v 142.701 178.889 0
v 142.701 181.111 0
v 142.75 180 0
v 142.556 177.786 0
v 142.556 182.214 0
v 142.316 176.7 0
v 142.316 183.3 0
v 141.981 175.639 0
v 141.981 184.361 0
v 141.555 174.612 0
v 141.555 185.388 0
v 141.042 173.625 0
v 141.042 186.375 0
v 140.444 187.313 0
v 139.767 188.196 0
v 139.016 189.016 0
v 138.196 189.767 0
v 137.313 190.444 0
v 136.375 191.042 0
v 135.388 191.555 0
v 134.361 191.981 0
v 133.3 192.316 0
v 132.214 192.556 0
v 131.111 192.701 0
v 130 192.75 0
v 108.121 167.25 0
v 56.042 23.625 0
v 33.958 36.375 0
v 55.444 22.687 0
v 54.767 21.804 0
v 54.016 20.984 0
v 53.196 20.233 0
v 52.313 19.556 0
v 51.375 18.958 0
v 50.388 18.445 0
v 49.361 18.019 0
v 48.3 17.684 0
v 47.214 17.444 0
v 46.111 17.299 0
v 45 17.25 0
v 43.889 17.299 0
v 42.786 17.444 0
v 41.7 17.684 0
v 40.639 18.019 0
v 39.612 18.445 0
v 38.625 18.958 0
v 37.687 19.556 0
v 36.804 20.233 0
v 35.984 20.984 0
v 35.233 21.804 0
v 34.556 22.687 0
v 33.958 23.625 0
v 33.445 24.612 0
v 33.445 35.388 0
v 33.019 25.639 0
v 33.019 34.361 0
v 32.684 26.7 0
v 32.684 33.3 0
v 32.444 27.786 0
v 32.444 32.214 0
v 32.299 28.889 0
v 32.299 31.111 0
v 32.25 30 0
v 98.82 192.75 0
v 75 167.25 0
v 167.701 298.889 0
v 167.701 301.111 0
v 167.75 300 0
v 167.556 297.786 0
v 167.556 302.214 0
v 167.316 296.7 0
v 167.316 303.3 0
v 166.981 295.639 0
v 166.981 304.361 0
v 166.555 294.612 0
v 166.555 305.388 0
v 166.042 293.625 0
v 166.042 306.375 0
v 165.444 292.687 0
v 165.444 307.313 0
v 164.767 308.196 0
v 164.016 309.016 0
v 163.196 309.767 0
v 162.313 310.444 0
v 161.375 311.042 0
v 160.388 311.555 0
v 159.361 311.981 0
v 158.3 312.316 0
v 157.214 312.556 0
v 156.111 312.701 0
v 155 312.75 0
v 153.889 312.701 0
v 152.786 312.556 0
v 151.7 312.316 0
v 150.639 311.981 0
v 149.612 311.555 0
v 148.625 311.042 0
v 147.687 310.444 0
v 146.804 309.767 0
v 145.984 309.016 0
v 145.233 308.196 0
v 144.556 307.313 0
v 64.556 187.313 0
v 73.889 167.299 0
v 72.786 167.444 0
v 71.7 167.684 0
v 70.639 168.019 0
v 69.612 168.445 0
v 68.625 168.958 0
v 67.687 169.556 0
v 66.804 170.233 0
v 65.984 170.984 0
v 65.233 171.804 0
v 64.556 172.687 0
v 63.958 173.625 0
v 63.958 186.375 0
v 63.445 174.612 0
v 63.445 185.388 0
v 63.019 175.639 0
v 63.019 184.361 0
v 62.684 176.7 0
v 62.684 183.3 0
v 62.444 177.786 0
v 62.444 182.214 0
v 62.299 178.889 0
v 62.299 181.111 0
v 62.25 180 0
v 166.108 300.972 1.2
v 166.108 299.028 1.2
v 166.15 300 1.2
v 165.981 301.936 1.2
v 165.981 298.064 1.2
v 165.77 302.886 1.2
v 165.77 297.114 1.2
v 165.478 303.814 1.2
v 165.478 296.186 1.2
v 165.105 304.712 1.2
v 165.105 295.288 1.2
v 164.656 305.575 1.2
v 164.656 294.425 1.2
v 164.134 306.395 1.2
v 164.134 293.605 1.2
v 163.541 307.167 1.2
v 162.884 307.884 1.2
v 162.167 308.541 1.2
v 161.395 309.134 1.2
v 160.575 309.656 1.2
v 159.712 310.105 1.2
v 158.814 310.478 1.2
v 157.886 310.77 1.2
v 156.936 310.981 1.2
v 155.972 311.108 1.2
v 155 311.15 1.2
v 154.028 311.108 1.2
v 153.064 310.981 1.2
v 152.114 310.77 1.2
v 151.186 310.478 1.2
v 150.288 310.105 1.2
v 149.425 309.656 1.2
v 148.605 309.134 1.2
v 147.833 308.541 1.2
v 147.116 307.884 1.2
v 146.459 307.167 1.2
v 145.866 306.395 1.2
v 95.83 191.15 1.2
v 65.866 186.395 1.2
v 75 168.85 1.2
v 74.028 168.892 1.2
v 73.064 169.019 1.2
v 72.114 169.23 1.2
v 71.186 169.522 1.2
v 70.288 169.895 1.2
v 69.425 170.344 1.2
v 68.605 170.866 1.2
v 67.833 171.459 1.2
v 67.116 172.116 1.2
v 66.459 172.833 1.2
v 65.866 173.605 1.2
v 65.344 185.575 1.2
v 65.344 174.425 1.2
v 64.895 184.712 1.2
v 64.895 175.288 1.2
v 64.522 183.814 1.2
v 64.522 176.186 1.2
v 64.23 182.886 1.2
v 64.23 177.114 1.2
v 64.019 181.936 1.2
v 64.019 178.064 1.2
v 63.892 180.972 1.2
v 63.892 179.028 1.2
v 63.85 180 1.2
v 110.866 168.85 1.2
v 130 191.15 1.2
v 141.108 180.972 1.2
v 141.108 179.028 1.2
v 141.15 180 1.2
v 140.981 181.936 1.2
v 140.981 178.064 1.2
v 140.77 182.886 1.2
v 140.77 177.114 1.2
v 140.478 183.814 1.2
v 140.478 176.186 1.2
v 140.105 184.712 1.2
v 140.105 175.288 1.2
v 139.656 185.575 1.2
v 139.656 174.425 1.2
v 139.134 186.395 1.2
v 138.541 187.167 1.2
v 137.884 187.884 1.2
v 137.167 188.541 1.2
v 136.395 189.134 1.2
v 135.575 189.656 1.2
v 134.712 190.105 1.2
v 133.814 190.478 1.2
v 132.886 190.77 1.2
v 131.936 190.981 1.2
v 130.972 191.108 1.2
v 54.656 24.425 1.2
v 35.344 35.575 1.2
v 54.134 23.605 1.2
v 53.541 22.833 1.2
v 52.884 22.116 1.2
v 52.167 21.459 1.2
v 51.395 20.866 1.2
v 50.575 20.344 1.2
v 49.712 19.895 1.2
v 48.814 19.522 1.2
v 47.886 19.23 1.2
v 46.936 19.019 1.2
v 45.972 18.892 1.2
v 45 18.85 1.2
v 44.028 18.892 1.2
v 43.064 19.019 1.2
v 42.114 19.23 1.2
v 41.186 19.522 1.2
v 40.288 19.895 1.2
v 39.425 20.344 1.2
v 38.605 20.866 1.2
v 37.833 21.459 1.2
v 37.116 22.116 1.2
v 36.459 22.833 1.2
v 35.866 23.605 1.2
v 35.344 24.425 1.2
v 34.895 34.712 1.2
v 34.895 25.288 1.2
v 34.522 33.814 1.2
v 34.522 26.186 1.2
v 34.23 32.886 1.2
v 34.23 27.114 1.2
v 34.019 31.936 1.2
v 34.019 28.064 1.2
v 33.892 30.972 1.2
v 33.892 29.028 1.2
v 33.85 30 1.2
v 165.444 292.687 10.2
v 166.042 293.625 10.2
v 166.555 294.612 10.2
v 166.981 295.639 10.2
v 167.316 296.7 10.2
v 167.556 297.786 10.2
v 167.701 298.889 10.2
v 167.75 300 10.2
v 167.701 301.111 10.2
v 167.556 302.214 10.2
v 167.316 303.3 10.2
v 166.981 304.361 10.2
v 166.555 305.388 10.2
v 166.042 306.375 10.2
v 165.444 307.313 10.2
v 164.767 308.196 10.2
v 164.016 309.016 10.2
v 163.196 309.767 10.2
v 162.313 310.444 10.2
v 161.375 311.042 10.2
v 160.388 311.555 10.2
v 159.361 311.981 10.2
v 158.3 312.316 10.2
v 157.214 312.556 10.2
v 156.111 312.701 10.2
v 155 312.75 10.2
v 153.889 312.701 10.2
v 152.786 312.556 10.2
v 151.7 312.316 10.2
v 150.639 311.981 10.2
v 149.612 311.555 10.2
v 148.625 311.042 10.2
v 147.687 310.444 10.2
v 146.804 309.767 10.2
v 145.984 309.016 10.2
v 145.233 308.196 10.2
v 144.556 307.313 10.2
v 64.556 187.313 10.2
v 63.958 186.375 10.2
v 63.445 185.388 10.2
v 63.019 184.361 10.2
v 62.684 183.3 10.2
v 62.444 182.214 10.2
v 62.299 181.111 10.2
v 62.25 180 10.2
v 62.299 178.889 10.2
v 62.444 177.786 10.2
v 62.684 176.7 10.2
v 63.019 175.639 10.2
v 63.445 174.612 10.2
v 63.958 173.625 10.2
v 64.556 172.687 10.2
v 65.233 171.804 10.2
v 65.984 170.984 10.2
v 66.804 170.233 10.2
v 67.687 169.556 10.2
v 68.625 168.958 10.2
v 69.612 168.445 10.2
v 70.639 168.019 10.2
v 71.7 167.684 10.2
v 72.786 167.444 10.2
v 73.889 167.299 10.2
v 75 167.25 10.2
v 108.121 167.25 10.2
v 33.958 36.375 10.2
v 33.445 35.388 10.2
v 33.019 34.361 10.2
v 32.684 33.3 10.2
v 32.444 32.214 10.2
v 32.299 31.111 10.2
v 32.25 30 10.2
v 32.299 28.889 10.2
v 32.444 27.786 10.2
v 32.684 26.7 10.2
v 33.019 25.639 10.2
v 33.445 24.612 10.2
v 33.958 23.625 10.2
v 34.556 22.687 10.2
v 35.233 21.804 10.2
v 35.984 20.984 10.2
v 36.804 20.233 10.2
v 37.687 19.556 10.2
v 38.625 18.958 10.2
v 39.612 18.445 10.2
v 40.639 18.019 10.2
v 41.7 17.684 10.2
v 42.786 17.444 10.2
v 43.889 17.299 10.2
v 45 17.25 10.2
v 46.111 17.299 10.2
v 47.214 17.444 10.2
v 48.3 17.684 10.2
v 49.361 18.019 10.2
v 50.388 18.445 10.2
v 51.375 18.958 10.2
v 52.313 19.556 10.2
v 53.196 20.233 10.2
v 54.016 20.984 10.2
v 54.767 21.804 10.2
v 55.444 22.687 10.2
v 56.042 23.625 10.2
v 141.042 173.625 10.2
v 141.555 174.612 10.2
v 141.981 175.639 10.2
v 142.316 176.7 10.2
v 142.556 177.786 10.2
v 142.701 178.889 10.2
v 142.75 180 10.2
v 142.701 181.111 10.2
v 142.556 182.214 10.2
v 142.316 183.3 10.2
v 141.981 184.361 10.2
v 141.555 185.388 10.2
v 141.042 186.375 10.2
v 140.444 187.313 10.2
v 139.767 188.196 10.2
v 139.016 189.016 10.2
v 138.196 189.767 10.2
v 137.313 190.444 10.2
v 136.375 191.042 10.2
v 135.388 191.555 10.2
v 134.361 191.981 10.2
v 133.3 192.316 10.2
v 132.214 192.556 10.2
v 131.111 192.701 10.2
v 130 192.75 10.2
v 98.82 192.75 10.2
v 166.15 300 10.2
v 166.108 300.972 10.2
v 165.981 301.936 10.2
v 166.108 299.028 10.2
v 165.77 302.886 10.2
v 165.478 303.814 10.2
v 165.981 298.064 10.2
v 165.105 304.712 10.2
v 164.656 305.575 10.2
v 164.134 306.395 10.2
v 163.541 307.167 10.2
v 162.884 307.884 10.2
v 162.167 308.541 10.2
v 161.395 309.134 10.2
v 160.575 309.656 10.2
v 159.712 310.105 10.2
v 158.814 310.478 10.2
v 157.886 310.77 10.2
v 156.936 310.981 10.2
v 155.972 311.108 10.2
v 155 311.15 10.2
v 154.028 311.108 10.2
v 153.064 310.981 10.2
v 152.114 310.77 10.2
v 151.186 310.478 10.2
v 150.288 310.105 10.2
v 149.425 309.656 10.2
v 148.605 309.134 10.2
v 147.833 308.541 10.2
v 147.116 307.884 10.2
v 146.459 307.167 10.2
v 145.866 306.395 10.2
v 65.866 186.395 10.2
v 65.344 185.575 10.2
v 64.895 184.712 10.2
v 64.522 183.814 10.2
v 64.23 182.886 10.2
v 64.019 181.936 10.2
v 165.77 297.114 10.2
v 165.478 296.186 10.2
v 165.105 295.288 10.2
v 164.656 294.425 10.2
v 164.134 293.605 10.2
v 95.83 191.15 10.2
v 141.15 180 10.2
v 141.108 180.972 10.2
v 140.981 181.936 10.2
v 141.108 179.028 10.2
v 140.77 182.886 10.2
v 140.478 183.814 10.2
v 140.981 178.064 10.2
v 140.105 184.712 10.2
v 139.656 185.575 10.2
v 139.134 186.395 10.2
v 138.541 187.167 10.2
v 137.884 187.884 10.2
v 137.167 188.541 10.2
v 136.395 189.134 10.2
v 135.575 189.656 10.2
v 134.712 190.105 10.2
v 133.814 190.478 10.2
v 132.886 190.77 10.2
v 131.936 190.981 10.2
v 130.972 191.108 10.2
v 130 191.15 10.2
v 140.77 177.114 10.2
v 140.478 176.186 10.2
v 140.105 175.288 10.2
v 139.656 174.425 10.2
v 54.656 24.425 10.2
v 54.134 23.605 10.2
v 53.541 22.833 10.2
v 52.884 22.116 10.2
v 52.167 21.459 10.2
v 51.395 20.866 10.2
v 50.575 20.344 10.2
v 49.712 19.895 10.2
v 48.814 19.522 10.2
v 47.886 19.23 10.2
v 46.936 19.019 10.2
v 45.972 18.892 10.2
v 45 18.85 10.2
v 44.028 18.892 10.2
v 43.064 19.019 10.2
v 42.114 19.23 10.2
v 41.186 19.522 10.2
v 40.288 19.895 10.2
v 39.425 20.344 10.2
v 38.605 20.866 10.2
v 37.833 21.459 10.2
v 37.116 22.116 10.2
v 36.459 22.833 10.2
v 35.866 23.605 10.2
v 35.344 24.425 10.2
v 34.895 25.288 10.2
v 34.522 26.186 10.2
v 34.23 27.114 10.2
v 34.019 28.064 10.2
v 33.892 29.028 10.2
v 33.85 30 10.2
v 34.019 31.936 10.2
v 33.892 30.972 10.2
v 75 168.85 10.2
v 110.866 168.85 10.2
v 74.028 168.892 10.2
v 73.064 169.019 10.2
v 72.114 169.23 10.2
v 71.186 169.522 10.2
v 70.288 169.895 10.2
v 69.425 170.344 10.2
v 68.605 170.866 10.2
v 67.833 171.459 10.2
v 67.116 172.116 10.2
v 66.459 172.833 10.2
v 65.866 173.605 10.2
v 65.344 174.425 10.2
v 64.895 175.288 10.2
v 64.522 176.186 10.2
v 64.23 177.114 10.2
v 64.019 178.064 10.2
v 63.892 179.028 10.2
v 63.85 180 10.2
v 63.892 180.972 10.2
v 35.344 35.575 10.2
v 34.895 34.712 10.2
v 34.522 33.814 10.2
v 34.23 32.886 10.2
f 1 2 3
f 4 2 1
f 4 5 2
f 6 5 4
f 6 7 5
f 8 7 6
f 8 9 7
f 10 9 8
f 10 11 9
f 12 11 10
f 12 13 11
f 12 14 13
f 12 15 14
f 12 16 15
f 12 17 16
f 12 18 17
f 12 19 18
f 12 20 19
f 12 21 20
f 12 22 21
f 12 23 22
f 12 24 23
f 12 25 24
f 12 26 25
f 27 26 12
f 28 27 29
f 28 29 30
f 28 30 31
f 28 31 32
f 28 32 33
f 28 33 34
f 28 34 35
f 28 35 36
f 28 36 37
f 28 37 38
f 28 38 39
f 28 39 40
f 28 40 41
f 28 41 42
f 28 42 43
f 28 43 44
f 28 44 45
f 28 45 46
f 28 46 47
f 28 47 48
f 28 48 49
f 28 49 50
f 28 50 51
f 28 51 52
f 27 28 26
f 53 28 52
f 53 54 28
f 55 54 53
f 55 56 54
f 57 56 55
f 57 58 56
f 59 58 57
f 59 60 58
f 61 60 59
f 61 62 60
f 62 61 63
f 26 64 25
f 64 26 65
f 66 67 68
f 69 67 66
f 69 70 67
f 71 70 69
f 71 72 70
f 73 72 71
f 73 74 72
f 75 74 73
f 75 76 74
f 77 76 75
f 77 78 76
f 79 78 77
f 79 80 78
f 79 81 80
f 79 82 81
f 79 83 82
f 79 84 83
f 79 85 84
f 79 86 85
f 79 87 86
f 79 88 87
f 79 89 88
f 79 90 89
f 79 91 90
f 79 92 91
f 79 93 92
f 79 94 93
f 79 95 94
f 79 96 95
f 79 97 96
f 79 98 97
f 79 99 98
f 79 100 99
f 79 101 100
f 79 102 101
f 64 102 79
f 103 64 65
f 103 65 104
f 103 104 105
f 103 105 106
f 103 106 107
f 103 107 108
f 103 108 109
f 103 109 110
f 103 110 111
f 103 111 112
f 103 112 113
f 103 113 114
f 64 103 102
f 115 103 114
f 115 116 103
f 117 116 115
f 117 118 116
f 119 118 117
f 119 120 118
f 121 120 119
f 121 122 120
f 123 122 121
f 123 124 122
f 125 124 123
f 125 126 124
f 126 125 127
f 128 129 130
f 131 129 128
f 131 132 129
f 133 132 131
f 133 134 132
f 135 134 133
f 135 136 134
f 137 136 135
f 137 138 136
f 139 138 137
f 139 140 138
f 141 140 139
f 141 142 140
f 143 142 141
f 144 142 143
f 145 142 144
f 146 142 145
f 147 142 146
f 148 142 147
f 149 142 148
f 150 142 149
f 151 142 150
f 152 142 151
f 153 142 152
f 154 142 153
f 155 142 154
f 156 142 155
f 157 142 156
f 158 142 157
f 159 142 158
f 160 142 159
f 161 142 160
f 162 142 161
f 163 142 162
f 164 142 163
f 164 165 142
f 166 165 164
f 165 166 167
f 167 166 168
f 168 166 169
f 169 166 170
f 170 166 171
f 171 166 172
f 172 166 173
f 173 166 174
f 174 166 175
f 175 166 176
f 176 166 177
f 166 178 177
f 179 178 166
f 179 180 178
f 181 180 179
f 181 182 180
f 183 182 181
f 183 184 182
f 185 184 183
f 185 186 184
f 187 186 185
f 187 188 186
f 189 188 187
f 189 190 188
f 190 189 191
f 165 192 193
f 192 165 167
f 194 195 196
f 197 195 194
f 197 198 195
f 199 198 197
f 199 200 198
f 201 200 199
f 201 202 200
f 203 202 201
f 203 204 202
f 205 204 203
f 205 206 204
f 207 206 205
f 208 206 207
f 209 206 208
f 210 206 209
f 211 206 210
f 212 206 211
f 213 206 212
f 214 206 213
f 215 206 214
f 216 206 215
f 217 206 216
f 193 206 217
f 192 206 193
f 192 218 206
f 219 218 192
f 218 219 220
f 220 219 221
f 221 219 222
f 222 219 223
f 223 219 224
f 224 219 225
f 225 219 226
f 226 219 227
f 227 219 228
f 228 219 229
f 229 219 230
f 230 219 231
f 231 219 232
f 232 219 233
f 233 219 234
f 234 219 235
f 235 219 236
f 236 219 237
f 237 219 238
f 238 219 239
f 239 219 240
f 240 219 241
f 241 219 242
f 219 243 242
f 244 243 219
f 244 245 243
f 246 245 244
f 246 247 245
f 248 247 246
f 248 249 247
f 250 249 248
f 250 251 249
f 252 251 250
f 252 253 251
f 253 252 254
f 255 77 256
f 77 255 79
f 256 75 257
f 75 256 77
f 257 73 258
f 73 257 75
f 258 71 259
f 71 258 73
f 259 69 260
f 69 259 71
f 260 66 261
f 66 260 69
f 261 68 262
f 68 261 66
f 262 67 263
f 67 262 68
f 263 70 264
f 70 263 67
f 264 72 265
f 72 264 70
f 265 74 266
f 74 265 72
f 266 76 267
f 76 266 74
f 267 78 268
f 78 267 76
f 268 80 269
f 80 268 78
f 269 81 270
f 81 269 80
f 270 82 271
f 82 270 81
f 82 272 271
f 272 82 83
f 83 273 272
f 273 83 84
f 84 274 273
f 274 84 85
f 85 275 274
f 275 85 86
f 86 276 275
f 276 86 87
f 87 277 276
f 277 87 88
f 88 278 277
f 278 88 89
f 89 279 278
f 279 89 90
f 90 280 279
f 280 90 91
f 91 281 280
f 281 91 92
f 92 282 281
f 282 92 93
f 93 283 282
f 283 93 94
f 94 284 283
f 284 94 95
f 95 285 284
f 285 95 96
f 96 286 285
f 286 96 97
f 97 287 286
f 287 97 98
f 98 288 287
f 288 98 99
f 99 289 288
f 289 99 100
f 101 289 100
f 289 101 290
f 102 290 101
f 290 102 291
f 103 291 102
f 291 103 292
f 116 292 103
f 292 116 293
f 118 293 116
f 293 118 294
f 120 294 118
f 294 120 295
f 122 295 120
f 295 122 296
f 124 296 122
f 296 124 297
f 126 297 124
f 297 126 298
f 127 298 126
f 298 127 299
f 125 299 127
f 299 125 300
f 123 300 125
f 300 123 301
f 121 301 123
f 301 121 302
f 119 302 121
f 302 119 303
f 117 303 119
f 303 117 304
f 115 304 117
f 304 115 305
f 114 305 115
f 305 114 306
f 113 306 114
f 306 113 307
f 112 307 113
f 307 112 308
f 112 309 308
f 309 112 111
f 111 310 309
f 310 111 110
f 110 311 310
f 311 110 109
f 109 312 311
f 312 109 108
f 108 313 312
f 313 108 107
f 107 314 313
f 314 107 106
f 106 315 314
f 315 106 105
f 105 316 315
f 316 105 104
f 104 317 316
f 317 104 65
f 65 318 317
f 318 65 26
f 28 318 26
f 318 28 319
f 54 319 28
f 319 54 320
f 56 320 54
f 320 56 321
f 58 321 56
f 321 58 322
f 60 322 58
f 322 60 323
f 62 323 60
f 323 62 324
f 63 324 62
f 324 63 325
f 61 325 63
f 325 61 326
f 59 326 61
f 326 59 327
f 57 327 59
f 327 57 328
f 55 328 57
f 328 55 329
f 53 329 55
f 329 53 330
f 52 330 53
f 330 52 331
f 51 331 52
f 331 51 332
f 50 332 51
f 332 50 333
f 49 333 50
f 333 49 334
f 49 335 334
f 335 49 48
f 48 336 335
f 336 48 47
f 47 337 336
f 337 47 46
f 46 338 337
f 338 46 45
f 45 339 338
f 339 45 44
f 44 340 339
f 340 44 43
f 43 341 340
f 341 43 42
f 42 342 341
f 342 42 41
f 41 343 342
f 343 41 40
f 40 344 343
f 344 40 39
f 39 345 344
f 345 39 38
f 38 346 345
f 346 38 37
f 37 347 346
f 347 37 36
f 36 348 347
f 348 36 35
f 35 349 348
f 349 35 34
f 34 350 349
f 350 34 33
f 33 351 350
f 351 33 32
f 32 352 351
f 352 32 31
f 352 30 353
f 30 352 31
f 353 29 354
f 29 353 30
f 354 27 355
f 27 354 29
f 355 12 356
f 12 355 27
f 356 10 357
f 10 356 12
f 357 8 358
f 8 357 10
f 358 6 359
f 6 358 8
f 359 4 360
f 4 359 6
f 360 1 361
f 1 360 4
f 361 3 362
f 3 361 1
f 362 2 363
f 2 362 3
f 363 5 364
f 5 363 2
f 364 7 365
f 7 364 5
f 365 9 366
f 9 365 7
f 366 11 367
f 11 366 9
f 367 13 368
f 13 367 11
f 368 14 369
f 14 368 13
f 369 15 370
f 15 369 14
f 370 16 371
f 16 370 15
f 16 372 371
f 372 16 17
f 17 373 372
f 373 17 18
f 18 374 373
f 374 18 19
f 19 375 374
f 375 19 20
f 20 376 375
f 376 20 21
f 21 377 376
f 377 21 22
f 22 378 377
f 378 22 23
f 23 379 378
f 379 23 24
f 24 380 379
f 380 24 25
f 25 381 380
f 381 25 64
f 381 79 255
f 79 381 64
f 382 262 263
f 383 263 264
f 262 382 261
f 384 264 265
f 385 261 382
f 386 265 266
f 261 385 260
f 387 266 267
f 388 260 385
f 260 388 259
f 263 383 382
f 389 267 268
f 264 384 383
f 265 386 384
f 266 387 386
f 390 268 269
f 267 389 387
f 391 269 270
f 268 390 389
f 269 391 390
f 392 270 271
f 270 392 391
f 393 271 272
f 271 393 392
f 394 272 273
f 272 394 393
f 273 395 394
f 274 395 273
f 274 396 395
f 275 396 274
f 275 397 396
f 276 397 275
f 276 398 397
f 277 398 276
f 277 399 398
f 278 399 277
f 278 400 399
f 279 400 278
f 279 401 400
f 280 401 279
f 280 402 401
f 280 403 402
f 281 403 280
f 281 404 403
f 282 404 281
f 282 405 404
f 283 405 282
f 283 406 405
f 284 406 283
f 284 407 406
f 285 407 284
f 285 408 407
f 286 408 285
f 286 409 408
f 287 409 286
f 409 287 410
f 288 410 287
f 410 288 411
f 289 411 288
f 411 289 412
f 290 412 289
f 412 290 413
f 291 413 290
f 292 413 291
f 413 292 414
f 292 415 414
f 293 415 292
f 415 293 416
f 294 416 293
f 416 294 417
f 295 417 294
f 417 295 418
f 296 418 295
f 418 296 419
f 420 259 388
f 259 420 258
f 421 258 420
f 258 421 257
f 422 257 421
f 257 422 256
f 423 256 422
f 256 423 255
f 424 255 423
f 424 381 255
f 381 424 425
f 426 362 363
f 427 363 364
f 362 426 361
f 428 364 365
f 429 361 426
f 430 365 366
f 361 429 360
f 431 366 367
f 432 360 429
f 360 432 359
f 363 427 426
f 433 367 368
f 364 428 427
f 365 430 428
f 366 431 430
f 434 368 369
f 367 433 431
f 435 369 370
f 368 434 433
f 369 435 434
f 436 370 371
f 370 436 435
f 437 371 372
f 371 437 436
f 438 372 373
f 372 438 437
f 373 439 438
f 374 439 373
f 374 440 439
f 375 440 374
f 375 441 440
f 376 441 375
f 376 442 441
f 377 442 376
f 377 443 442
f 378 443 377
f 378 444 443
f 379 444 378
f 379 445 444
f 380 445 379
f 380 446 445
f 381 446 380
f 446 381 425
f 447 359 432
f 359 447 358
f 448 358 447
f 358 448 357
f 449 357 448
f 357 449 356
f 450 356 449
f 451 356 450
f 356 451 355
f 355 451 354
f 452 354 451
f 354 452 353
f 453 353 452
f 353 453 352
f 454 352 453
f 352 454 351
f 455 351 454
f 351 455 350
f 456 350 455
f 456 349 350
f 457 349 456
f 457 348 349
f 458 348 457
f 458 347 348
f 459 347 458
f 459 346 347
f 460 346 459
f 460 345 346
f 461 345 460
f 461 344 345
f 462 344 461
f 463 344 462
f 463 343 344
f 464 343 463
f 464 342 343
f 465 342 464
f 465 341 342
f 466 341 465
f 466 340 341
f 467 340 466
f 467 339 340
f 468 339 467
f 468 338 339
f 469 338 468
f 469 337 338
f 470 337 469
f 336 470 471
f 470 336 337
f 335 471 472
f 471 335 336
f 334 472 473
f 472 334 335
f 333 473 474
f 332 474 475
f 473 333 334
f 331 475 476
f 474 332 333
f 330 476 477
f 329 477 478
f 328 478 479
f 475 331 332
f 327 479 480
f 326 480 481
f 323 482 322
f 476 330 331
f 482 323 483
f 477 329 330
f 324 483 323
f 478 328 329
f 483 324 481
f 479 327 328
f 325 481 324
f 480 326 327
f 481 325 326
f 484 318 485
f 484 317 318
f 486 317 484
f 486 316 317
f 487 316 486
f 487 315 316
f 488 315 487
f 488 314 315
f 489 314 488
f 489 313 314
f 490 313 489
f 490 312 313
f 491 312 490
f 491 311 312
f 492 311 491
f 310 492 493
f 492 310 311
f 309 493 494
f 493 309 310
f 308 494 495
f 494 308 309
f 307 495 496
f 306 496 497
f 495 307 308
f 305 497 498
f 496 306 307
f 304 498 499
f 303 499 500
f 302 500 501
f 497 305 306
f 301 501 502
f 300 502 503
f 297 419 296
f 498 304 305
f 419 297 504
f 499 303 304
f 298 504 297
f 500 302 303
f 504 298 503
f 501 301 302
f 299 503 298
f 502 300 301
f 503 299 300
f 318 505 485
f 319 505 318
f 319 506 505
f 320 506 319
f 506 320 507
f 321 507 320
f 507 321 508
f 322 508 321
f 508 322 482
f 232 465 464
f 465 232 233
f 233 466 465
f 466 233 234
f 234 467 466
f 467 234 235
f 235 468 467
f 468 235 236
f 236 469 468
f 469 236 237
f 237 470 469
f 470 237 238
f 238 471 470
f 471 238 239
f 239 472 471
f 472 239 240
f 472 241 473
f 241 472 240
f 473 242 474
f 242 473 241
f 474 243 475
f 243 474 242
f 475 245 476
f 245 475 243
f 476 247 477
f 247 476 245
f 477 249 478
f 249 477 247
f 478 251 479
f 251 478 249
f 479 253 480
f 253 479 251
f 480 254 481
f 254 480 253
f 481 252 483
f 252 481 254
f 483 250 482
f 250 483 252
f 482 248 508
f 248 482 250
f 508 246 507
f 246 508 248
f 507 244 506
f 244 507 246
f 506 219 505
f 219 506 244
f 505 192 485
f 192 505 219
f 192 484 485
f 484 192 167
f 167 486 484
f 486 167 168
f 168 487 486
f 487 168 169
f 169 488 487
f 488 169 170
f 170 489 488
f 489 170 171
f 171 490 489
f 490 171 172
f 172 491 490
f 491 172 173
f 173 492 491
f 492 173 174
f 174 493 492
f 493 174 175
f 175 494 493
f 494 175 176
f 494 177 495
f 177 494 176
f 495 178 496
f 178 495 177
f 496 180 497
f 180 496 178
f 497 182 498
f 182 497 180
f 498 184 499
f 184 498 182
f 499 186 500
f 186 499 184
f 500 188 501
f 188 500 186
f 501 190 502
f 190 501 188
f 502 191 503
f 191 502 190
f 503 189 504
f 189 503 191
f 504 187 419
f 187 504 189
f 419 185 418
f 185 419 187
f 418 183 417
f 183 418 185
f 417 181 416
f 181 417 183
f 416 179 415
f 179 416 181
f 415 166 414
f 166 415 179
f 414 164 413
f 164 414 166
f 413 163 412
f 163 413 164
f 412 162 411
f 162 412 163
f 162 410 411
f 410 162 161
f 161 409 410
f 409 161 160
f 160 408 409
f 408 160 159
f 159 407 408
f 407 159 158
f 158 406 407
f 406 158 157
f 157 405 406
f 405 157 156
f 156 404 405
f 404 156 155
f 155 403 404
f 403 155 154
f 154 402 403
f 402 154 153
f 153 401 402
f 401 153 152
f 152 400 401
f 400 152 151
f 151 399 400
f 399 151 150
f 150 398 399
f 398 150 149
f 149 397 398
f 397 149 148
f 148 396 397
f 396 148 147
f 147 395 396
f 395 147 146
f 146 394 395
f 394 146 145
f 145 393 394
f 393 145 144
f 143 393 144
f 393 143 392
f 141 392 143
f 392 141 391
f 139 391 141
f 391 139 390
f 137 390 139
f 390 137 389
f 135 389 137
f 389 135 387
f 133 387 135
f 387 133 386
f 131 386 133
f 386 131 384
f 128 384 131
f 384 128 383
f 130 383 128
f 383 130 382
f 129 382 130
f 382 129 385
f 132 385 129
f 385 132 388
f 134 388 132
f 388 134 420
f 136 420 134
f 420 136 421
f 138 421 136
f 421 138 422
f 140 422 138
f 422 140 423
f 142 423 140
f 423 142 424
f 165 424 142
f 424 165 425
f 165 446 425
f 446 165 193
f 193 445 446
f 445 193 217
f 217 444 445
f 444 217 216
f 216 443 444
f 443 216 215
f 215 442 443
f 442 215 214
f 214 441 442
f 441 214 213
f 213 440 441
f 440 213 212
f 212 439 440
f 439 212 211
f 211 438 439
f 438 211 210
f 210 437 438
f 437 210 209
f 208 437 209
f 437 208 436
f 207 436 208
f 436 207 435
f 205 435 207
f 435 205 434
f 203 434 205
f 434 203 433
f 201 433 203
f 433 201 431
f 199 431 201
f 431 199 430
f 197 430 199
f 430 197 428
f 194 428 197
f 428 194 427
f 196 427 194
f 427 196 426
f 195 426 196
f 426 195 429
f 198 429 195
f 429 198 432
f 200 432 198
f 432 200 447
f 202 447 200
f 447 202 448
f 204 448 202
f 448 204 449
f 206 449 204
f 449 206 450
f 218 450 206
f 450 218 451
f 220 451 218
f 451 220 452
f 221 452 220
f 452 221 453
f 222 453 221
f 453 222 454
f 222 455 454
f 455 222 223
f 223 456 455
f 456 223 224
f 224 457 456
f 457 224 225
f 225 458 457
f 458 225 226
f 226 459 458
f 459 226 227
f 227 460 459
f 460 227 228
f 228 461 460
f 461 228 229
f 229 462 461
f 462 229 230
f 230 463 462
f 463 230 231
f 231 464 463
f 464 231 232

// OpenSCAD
// file: ../bolt.scad
bolt_pts  = [[155.0,300.0], [75.0,180.0], [130.0,180.0], [45.0,30.0]];
pixel_pts = [[155.0,300.0], [145.5,285.8], [136.0,271.5], [126.5,257.2], [117.0,243.0], [107.5,228.8], [98.0,214.5], [88.5,200.2], [79.0,186.0], [95.1,180.0], [112.3,180.0], [129.4,180.0], [121.4,164.8], [113.0,149.9], [104.5,135.1], [96.1,120.2], [87.6,105.3], [79.2,90.4], [70.8,75.5], [62.3,60.6], [53.9,45.7], [45.4,30.8]];

// ===== CHARGE lightning-bolt test piece — option C (~18mm channel) =====
bolt_inner     = 18;                       // channel interior (collar O16 fits)
bolt_wall      = 2;                         // wall thickness
bolt_outer     = bolt_inner + 2*bolt_wall; // 22mm outer stroke
bolt_gap       = 15;                       // LED-tip -> lens
bolt_ch_h      = dome_clear + bolt_gap;    // wall height above plate
bolt_lens_t    = 1.5;                       // lens face thickness
bolt_lip_h     = 2;                         // lens locating lip depth
bolt_lip_clear = 0.6;                       // lip clearance into channel
bolt_lip_t     = 1.2;                       // lip wall thickness

module bolt_stroke(w) {
    for (i = [0 : len(bolt_pts) - 2])
        hull() {
            translate(bolt_pts[i])     circle(d = w);
            translate(bolt_pts[i + 1]) circle(d = w);
        }
}

// wall_h = channel wall height above the plate (gap = wall_h - dome_clear).
// The lens caps the cross-section, so the SAME lens fits any wall_h.
module bolt_shell(wall_h = bolt_ch_h) {
    difference() {
        union() {
            linear_extrude(plate_t) bolt_stroke(bolt_outer);
            translate([0, 0, plate_t]) linear_extrude(wall_h)
                difference() { bolt_stroke(bolt_outer); bolt_stroke(bolt_inner); }
        }
        for (p = pixel_pts)
            translate([p[0], p[1], -0.1]) cylinder(h = plate_t + 0.2, d = pixel_through);
    }
    for (p = pixel_pts) place_collar(p[0], p[1]);
}

module bolt_lens() {
    union() {
        linear_extrude(bolt_lens_t) bolt_stroke(bolt_outer);
        translate([0, 0, bolt_lens_t]) linear_extrude(bolt_lip_h)
            difference() {
                bolt_stroke(bolt_inner - bolt_lip_clear);
                bolt_stroke(bolt_inner - bolt_lip_clear - 2 * bolt_lip_t);
            }
    }
}

// ----- snap-OVER lens: a cap that wraps the WHOLE bolt outside (skirt grips the
// 22mm outer wall). Works because the bolt is a single isolated piece. Top = the
// diffuser face. Print top-down, flip in use; fits any bolt height.
// 2-filament: clear for the first cap_top_t (top), white above (skirt) via a
// slicer height color-change. 3-filament: also paint the skirt's outer wall black.
cap_clear   = 0.3;   // skirt-inner = bolt_outer + this (slide/snap over)
cap_wall    = 1.6;   // skirt wall thickness
cap_top_t   = 1.2;   // diffuser top thickness
cap_skirt_h = 9;     // how far the skirt wraps down the bolt sides

module bolt_overcap() {
    si = bolt_outer + cap_clear;
    so = si + 2 * cap_wall;
    union() {
        linear_extrude(cap_top_t) bolt_stroke(so);
        translate([0, 0, cap_top_t]) linear_extrude(cap_skirt_h)
            difference() { bolt_stroke(so); bolt_stroke(si); }
    }
}
// file: ../collar.scad
// Calibrated press-fit collar, merged into the rear wall at each pixel.
// The STL is symmetric top/bottom (retention lip at mid-height), so insertion
// direction does not matter. Native STL sits X-centered at collar_cx, Z 0..collar_h.

module collar_solid() {
    translate([-collar_cx, 0, 0])
        import(collar_stl, convexity = 6);
}

module place_collar(x, y) {
    translate([x, y, 0]) collar_solid();
}
// file: ../config.scad
// ===== CHARGE LED sign — global config =====
// Edit this file; then run ./build.sh to regenerate every STL.

$fn = 72;

// ---- calibrated collar (press-fit for 12mm bullet pixel) ----
collar_stl    = "../../assets/bullet-collar.stl"; // path resolved from src/parts/ entry files
collar_h      = 2.0;     // Z span of the collar STL
collar_od     = 16.0;    // collar outer diameter
collar_cx     = 43.0;    // STL native X center (Y center is 0)
pixel_through = 12.3;    // clearance hole through the plate (just over bore Ø12.19)
dome_clear    = 4.0;     // dome protrusion above plate front. Spec: 5.5mm dome-tip-to-flange,
                         // flange seats on plate back, minus 2mm plate ~= 3.5-4mm. Seat a real
                         // pixel and measure to lock it in.

// ---- shell ----
plate_t    = 2.0;        // rear plate thickness (== collar_h, so the collar sits flush)
wall_t     = 2.5;        // chimney wall thickness
cell_inner = 30;         // square interior of each test cell (the press-fit opening)

// ---- diffuser panels (flat, drop-in — kept for the final glued option) ----
panel_press_clear = 0.25; // panel is this much SMALLER than the opening (total) -> friction fit
panel_thicks      = [1, 2, 3];

// ---- diffuser CAP (slides over an ISOLATED chimney; not used on touching rows) ----
cap_fit_clear = 0.4;   // skirt-inner minus chimney-outer (total); bigger = looser slide
cap_skirt_t   = 1.6;   // skirt wall thickness
cap_skirt_h   = 7;     // how far the skirt grips down over the chimney

// ---- diffuser LID = flanged plug (plug locates in the opening, flange catches on the rim) ----
lid_flange_cover = wall_t;  // flange overhang per side ~= wall width (rests on rim, can't fall in)
lid_flange_gap   = 0.3;     // shrink the flange a hair so neighbour lids don't clash
lid_plug_h       = 4;       // how far the plug drops into the opening (0 = plain flat tile)
lid_plug_clear   = 0.2;     // plug-outer = opening minus this (total) -> friction fit
                            // (was 0.5/loose; PETG plug in a PLA hole grips well at 0.2)
lid_plug_wall    = 1.5;     // plug-frame wall thickness

// ---- coupon depth ladder ----
led_gaps = [10, 15, 20]; // clear LED-tip -> diffuser distance, per cell (mm)
                         // (was [20,35,50] — 35/50 went too dim/washed; 20 is the new max)

// ---- collar v2: original bore + lip, plus a 45-deg lead-in chamfer ----
bore_face_r   = 6.10;    // collar bore radius at each face (~Ø12.2)
chamfer_depth = 0.5;     // axial depth of the 45-deg lead-in at each face
mouth_r       = bore_face_r + chamfer_depth;  // chamfer mouth radius (~Ø13.2)

// ---- collar A/B test harness ----
harness_w     = 52;      // tile width
harness_d     = 30;      // tile depth
harness_t     = plate_t; // match the real wall thickness for a faithful fit test
harness_pitch = 24;      // spacing between the two hole centers

// ---- derived ----
cell_pitch = cell_inner + 2 * wall_t;      // outer cell footprint (35)
n_cells    = len(led_gaps);
plate_w    = n_cells * cell_pitch;
plate_d    = cell_pitch;
panel_side = cell_inner - panel_press_clear;
function cell_x(i)     = i * cell_pitch + cell_pitch / 2;   // column center (distance)
function cell_y(j)     = j * cell_pitch + cell_pitch / 2;   // row center (for grid coupons)
function chimney_H(i)  = plate_t + dome_clear + led_gaps[i];
// main file
// Build target: snap-over bolt lens (wraps the whole bolt). Print top-face-down,
// skirt up; flip in use. One filament to start; or clear top + white skirt via a
// slicer height color-change at z = cap_top_t.
include <../config.scad>
include <../collar.scad>
include <../bolt.scad>
bolt_overcap();
